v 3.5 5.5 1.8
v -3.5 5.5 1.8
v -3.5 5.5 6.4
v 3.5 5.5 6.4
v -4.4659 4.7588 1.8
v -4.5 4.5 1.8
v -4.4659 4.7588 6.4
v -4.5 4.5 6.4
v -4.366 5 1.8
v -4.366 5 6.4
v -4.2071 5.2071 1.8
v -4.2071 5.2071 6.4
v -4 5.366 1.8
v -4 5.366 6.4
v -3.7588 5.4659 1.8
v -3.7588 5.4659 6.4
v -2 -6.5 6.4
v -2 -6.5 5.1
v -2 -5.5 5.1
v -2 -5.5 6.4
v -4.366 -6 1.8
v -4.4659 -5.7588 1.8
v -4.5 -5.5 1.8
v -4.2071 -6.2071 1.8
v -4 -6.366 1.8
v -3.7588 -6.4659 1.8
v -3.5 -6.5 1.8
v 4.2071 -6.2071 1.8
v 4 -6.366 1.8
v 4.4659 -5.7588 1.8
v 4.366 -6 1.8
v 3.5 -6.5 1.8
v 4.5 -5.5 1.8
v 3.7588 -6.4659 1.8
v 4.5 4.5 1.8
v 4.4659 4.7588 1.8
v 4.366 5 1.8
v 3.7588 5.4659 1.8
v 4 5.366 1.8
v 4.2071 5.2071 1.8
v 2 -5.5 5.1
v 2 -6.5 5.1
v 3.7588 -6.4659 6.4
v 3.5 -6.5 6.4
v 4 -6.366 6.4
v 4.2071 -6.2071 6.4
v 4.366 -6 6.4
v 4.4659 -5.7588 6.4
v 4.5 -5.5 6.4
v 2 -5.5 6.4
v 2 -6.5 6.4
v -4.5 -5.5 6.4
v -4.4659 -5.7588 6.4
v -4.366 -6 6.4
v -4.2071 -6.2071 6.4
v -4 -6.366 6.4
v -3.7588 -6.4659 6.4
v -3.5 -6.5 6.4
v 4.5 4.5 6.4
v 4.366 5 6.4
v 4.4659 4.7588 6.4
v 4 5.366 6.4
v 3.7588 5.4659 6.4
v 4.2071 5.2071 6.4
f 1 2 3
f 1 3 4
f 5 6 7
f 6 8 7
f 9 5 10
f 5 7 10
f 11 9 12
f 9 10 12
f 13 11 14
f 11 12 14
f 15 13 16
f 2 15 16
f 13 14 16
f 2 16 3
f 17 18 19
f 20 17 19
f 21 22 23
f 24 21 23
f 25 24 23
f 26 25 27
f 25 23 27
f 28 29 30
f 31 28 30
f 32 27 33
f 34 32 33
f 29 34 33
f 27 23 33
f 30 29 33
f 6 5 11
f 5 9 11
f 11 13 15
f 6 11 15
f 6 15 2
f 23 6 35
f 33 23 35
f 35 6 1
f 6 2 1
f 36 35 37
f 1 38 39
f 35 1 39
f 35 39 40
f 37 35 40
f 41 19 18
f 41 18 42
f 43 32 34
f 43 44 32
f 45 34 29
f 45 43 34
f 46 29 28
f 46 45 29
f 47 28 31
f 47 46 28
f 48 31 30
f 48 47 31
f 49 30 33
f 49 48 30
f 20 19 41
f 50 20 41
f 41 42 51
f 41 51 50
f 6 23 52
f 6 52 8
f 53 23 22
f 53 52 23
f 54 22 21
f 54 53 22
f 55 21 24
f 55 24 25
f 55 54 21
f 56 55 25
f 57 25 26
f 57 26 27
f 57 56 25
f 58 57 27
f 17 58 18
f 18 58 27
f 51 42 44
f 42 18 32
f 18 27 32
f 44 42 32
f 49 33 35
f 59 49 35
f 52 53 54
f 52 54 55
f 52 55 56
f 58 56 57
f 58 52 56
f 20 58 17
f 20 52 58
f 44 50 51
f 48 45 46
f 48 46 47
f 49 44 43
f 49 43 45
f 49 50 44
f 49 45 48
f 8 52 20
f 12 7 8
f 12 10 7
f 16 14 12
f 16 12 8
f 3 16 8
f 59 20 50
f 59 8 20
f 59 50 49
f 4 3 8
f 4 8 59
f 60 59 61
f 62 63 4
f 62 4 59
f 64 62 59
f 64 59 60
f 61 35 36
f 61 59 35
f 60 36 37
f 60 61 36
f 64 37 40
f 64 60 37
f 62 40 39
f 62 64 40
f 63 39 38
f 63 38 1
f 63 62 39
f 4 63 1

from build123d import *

# Parameters (mm, degrees)
BOX010_W     = 4
BOX010_H     = 1
BOX010_DEPTH = 1.3
BOX001_W     = 9
BOX001_H     = 12
BOX001_DEPTH = 4.6
FILLET_R     = 1


with BuildPart() as cube010:
    # Box010 → Box010 (new body)
    with BuildSketch(Plane(origin=(-2, -6.5, 5.1), x_dir=(1, 0, 0), z_dir=(0, 0, 1))):
        with Locations((2, 0.5)):
            Rectangle(BOX010_W, BOX010_H)
    extrude(amount=BOX010_DEPTH)


with BuildPart() as cut005:
    # Box001 → Box001 (new body)
    with BuildSketch(Plane(origin=(-4.5, -6.5, 1.8), x_dir=(1, 0, 0), z_dir=(0, 0, 1))):
        with Locations((4.5, 6)):
            Rectangle(BOX001_W, BOX001_H)
    extrude(amount=BOX001_DEPTH)

    # Fillet
    fillet_edges = [cut005.edges().sort_by_distance(p)[0] for p in [
        (-4.5, -6.5, 4.1),
        (-4.5, 5.5, 4.1),
        (4.5, -6.5, 4.1),
        (4.5, 5.5, 4.1),
    ]]
    fillet(fillet_edges, radius=FILLET_R)

    # Cut005: cut Cube010
    add(cube010.part, mode=Mode.SUBTRACT)


solid = cut005.part
